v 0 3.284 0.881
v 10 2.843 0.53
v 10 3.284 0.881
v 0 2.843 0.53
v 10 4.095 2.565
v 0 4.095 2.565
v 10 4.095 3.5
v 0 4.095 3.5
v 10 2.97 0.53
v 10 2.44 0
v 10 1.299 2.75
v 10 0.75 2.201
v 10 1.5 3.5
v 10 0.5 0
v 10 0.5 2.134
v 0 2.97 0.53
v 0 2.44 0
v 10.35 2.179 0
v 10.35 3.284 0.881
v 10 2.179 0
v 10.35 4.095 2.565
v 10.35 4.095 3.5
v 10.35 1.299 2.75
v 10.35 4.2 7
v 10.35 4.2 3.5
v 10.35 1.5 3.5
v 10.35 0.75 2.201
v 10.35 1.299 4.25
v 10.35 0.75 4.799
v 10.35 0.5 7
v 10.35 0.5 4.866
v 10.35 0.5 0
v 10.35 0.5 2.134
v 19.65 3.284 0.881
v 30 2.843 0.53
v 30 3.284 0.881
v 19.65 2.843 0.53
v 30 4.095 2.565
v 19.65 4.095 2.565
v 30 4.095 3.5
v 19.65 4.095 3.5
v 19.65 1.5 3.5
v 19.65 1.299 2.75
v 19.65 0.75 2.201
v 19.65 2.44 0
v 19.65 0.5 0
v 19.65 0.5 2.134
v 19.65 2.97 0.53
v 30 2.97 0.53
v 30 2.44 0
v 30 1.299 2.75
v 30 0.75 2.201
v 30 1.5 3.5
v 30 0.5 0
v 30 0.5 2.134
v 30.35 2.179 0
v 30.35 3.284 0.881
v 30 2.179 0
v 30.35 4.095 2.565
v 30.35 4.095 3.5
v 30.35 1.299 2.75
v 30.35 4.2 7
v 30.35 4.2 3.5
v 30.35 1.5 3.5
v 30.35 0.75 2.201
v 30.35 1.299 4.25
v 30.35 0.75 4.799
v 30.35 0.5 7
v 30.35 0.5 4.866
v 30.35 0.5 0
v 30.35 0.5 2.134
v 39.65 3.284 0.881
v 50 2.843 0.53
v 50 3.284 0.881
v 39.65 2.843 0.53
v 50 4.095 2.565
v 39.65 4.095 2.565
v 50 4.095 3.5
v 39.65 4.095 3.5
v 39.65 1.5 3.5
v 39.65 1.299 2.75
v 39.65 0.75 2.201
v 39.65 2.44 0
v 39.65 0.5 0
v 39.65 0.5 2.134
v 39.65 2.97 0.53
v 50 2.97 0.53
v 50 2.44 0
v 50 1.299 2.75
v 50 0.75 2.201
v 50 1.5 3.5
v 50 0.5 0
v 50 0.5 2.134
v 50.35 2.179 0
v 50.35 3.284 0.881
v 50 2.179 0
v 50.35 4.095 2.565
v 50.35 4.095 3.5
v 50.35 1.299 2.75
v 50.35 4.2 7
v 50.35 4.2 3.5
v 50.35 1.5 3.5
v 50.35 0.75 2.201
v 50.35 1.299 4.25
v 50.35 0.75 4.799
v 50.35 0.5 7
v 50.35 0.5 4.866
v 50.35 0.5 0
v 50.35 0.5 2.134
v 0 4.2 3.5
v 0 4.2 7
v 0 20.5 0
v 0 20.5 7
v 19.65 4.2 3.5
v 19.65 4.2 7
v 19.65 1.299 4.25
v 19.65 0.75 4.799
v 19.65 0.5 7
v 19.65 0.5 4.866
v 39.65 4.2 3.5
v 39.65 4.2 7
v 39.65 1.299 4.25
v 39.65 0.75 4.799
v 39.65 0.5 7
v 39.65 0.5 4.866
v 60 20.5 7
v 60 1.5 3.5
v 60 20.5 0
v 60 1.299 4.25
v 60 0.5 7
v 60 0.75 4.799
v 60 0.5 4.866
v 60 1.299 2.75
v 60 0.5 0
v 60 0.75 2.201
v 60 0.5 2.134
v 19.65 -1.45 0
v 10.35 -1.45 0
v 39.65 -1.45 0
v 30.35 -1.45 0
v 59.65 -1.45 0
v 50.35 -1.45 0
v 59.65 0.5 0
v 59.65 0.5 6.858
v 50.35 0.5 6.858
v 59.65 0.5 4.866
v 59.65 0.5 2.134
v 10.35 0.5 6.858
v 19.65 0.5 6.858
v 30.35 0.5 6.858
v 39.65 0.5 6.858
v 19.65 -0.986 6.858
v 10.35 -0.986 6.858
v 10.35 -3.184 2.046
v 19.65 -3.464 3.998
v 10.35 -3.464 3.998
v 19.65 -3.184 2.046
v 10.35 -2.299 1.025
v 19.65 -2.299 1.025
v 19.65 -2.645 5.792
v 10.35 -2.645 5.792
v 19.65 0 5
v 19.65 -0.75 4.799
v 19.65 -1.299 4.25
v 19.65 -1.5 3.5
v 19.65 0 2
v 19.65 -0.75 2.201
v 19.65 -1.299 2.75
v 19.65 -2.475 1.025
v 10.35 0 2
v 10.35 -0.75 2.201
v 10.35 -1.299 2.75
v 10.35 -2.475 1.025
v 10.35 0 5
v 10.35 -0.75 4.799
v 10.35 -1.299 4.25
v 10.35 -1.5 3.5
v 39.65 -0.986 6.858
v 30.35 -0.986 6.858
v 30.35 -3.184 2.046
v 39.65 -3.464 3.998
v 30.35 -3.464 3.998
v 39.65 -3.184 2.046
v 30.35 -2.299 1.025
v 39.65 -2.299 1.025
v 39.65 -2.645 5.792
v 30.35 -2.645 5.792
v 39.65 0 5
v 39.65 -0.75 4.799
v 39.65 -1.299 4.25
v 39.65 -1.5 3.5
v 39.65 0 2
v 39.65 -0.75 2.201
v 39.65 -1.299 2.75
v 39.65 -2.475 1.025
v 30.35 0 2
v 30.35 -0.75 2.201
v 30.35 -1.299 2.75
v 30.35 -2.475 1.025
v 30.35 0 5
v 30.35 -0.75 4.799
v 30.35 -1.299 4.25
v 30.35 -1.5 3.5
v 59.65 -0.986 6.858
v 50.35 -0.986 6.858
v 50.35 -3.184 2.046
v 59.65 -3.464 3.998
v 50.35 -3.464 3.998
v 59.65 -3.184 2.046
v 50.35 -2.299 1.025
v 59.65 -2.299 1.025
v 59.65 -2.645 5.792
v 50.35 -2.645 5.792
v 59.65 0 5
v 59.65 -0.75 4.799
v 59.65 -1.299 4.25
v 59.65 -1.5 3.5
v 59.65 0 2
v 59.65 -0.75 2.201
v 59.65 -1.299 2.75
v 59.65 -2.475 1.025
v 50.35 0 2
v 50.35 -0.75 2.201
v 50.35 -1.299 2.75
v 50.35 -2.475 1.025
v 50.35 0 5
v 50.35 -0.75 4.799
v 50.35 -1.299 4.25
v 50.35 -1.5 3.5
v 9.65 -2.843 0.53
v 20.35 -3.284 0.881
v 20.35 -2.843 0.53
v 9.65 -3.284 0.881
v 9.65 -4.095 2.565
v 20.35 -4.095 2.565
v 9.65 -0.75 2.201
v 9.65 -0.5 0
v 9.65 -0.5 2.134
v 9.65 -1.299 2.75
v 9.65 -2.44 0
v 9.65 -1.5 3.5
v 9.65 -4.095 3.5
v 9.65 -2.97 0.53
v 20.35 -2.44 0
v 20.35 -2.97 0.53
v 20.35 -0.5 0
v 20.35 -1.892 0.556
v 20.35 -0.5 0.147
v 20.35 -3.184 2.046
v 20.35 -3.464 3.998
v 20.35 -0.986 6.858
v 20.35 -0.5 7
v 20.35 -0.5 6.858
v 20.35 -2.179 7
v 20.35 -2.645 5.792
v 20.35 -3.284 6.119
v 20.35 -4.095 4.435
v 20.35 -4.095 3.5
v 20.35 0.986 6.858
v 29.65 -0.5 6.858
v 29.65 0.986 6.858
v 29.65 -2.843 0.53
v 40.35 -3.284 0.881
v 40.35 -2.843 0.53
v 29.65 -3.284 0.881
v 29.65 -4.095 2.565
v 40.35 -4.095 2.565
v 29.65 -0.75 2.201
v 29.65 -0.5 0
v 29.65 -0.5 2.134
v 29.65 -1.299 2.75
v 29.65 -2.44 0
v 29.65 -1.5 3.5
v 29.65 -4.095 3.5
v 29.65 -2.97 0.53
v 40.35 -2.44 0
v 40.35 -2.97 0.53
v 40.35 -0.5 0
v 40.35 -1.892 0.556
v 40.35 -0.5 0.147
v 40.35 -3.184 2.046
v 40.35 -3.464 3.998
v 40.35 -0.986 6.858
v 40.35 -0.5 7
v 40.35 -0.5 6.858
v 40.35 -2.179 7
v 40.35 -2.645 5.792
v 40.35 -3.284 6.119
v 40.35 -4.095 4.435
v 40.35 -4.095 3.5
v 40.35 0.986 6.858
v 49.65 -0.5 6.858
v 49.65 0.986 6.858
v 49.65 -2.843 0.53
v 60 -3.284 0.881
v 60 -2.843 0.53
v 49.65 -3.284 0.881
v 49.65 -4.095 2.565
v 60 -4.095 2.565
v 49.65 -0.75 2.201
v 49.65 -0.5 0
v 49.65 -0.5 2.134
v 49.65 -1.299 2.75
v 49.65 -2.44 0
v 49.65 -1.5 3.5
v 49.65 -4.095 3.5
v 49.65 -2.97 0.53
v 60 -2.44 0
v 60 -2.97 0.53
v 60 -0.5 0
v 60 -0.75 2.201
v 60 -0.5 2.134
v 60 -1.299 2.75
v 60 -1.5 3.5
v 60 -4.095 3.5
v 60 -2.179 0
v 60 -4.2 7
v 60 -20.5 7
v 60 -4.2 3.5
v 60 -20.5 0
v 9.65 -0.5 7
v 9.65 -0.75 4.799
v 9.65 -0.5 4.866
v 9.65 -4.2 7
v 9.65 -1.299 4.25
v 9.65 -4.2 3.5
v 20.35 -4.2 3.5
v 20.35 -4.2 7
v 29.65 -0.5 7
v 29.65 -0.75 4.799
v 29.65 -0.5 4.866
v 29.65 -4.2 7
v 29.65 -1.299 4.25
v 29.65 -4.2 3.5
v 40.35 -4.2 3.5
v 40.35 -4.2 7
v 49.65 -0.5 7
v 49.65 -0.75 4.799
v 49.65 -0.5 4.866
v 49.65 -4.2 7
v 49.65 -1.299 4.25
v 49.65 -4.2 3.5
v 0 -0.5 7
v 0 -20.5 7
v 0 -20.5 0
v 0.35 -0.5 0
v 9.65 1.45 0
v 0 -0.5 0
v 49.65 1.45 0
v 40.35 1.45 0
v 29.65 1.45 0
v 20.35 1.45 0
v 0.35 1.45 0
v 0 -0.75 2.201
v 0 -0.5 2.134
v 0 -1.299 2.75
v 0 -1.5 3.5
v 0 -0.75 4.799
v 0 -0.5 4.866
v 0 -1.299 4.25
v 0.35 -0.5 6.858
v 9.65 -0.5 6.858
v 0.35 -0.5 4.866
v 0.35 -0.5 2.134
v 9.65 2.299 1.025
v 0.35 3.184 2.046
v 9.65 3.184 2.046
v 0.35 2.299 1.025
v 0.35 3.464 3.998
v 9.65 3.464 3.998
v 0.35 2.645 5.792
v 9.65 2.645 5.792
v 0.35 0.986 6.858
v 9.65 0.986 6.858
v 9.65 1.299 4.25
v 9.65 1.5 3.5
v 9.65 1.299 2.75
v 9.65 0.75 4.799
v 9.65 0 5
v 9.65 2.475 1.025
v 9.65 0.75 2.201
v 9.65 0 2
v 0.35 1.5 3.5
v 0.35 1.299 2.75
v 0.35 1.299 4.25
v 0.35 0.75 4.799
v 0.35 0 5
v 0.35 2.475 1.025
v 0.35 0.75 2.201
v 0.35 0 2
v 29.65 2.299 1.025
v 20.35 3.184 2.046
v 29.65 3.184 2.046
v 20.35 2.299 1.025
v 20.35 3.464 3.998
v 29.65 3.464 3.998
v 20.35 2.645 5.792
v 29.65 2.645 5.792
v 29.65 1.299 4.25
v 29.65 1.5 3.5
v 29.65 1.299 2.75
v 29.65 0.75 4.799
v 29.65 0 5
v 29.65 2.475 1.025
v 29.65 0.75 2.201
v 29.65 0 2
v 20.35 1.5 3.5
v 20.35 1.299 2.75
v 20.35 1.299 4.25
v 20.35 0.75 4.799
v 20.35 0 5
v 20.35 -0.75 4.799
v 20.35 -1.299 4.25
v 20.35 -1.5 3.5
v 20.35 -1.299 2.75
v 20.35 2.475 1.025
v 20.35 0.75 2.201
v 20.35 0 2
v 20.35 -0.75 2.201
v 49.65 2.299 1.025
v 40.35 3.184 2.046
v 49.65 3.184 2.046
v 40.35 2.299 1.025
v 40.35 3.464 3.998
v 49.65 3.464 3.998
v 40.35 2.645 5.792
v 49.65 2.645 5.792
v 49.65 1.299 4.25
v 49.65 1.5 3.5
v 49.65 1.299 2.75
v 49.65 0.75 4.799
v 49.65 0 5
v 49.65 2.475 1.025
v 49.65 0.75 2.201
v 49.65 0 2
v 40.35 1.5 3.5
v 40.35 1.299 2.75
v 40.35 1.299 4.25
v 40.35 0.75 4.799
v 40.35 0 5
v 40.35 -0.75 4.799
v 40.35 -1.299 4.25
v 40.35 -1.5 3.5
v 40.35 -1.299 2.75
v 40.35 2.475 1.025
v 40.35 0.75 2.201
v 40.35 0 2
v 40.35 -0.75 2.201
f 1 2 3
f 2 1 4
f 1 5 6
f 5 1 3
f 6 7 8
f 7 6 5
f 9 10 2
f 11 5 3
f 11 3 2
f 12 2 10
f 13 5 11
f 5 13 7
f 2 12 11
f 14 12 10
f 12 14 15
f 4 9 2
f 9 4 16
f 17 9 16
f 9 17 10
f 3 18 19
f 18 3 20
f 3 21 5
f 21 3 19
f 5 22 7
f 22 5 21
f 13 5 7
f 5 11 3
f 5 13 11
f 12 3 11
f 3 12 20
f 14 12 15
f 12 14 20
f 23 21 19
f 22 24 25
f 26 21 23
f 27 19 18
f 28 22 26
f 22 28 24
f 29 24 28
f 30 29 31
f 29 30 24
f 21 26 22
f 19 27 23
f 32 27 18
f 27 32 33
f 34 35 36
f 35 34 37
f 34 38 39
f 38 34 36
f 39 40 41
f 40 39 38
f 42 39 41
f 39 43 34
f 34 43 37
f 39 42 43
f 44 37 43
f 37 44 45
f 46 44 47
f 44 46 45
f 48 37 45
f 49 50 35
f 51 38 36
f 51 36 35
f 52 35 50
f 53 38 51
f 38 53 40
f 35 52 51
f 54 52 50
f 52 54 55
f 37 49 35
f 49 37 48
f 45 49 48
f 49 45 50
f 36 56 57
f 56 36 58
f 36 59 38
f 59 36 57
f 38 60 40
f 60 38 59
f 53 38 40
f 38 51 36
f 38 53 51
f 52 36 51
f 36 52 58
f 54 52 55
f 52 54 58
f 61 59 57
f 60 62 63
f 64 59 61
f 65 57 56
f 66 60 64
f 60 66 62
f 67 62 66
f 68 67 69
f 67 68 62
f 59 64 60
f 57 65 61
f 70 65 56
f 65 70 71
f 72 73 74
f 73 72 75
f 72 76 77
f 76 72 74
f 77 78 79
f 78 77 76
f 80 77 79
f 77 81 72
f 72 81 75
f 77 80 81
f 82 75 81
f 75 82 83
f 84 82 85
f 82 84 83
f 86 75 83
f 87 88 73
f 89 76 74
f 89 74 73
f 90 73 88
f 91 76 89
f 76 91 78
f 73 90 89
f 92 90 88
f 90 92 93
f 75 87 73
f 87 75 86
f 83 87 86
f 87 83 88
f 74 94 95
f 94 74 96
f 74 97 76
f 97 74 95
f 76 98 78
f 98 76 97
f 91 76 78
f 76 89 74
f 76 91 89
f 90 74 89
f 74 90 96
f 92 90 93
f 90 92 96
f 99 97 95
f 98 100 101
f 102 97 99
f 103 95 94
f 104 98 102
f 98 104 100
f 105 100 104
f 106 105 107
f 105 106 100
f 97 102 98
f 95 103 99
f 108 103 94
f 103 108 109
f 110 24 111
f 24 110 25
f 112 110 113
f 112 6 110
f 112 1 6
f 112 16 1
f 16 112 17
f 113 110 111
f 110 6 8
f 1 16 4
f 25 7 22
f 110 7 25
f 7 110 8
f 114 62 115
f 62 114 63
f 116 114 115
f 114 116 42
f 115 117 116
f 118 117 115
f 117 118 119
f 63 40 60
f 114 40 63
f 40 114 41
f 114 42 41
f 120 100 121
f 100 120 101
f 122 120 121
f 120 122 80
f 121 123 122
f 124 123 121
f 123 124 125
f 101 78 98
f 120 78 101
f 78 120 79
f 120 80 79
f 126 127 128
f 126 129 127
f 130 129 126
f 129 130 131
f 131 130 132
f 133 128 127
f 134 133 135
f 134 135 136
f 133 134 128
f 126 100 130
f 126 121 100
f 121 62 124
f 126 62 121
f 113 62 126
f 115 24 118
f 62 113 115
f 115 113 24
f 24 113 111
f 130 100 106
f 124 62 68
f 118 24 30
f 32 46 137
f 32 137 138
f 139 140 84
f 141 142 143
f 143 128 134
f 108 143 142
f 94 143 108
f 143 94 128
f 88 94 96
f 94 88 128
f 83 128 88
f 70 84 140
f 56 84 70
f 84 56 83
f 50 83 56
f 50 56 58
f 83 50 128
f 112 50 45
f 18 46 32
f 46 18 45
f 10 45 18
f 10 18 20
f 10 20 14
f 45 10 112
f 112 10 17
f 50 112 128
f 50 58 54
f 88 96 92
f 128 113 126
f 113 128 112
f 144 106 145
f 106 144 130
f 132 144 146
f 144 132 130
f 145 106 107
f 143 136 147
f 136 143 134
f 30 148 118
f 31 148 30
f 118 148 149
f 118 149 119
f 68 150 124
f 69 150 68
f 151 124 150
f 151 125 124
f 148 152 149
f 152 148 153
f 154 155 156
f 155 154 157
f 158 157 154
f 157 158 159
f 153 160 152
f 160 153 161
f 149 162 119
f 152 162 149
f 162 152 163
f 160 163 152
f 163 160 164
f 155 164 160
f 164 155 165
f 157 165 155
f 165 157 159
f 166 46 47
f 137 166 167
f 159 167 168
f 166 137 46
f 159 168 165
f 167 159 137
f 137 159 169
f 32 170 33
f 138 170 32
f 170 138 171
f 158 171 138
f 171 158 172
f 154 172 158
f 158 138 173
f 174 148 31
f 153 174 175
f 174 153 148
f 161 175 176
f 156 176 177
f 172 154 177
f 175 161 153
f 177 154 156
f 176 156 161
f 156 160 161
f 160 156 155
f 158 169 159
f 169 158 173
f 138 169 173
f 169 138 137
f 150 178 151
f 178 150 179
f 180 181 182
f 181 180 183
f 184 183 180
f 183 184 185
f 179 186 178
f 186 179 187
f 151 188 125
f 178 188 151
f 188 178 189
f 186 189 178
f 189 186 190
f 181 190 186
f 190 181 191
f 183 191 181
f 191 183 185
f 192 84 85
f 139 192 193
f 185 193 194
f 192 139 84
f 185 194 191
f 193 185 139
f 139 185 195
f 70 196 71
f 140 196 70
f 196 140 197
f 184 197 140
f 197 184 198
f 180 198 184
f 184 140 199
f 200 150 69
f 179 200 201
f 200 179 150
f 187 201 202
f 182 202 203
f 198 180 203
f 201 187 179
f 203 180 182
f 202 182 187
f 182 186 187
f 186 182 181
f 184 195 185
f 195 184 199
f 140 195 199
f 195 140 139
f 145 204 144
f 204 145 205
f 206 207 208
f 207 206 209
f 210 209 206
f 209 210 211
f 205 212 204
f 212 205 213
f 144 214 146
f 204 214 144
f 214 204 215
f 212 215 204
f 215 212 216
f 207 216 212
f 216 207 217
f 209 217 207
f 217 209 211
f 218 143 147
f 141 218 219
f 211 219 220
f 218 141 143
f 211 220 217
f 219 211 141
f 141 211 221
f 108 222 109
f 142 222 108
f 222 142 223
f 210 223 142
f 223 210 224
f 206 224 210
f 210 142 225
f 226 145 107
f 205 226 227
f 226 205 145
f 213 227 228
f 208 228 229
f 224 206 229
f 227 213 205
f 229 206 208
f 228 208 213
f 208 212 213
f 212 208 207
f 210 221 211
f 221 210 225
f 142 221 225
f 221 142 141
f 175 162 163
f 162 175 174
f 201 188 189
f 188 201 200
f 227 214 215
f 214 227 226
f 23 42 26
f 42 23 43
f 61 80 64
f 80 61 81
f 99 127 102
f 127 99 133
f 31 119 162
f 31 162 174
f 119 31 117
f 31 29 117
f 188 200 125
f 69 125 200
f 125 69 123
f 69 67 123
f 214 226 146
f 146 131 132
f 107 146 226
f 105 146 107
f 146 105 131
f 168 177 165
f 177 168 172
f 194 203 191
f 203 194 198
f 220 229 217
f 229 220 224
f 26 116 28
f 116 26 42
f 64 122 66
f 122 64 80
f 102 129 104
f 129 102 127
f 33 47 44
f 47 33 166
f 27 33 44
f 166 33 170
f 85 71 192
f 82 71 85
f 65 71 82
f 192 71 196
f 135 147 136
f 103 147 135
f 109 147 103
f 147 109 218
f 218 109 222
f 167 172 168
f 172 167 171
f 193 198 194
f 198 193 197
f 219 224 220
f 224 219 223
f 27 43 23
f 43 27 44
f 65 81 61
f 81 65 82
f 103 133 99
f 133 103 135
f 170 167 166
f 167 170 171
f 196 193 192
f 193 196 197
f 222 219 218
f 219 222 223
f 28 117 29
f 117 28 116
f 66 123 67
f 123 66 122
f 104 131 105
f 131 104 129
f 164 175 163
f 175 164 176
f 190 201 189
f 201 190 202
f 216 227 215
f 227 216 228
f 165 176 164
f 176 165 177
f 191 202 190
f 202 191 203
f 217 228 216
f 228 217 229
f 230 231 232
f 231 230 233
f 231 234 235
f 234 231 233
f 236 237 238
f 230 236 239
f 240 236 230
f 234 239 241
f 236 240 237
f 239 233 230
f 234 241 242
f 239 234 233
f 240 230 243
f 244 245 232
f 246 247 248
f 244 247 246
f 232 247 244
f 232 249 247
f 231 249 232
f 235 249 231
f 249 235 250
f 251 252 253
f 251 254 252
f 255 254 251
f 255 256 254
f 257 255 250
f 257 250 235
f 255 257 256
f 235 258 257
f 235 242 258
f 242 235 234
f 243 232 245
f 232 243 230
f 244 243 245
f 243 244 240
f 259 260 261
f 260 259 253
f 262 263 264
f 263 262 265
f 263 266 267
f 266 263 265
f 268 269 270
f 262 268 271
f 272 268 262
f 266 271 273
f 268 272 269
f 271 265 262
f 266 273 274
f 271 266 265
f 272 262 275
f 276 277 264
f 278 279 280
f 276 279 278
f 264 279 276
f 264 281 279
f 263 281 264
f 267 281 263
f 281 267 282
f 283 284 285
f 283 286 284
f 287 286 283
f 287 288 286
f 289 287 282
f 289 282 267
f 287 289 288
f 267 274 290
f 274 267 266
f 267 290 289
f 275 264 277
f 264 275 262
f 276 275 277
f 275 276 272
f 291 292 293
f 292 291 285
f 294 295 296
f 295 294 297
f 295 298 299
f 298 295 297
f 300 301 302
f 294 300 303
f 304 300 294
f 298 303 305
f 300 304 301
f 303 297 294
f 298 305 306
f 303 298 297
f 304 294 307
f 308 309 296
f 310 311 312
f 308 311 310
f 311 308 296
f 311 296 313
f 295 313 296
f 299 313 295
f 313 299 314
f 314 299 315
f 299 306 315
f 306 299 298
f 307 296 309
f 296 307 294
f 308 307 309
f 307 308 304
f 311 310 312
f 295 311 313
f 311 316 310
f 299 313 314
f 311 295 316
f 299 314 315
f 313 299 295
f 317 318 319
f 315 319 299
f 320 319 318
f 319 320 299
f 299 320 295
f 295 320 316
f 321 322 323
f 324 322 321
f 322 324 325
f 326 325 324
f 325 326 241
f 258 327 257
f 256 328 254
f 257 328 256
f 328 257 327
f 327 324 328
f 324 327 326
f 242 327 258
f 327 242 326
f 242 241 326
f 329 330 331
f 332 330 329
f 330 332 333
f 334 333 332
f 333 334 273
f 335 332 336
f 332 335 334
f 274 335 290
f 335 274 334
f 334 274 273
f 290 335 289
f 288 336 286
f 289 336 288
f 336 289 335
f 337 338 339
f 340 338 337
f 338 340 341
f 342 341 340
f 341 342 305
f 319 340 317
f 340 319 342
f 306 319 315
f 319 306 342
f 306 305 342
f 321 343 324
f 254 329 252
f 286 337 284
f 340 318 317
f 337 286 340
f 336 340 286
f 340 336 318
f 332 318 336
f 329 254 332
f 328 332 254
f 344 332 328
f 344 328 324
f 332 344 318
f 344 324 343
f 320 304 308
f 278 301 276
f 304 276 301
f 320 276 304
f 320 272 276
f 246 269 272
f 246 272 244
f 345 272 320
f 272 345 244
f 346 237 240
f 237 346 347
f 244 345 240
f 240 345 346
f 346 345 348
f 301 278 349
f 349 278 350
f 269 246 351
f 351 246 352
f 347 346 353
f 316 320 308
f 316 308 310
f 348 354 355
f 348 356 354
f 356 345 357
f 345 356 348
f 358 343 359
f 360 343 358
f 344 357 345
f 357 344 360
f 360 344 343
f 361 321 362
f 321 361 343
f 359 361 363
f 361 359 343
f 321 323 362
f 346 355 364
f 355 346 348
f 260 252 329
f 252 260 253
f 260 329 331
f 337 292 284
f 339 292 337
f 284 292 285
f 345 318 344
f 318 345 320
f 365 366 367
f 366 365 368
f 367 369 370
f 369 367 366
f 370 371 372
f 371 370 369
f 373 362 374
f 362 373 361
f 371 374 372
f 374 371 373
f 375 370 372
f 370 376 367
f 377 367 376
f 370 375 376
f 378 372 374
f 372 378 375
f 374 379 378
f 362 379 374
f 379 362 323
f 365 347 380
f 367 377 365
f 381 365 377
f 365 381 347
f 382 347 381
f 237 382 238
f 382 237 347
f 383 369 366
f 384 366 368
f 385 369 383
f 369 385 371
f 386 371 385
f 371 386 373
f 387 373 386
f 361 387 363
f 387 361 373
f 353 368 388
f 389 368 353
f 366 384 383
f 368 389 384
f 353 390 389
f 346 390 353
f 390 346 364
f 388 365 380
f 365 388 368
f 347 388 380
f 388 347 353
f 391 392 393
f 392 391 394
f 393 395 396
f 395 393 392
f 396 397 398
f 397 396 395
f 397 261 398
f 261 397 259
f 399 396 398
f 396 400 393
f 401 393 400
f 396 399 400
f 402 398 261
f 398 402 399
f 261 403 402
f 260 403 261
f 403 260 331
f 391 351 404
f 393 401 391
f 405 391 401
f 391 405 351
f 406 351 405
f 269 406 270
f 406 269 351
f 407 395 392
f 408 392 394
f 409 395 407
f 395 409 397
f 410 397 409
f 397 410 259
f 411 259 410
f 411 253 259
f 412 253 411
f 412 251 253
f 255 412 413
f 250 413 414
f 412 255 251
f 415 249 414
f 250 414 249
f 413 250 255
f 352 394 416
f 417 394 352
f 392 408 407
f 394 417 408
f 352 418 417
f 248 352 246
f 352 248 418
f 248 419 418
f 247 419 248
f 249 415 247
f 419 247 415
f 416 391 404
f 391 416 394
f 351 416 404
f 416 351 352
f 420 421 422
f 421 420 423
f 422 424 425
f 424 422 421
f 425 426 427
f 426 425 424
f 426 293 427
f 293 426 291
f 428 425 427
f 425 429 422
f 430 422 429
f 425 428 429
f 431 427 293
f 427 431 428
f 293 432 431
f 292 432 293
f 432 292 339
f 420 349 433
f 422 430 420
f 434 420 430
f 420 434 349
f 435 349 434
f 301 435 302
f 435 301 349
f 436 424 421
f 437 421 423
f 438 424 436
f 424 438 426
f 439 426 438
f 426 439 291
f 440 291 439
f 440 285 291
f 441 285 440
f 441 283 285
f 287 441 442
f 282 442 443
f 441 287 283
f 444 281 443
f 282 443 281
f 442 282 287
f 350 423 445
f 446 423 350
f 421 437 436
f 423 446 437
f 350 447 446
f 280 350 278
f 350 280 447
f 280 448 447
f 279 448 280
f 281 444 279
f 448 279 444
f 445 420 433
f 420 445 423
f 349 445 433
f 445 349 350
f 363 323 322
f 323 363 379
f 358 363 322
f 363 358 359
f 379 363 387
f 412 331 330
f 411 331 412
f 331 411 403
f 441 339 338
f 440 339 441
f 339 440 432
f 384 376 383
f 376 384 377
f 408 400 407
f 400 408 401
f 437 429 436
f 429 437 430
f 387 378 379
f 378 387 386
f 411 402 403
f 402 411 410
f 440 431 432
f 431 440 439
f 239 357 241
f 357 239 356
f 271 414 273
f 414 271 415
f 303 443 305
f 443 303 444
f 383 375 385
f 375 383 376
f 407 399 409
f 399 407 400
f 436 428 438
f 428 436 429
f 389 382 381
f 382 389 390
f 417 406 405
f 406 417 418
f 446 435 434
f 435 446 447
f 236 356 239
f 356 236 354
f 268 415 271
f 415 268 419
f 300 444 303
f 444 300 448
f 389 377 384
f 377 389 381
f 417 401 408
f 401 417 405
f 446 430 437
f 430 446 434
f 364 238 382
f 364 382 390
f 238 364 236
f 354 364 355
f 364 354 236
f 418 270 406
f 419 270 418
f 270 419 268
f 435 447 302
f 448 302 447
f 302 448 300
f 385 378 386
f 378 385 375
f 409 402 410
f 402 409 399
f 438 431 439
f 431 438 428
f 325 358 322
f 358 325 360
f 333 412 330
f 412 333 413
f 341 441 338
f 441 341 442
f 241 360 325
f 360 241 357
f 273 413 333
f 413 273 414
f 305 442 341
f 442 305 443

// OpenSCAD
// A library to create print-in-place horizontal hinges.
//
// Copyright (c) 2020 Rodrigo Chandia (rodrigo.chandia@gmail.com)
// All rights reserved.
//
// This program is distributed in the hope that it will be useful,
// but WITHOUT ANY WARRANTY; without even the implied warranty of
// MERCHANTABILITY or FITNESS FOR A PARTICULAR PURPOSE.
//
// The contents of this file are DUAL-LICENSED.  You may modify and/or
// redistribute this software according to the terms of one of the
// following two licenses (at your option):
//
// License 1: Attribution-ShareAlike 4.0 International (CC BY-SA 4.0)
//            https://creativecommons.org/licenses/by-sa/4.0/
//
// License 2: GNU General Public License (GPLv3)
//            https://www.gnu.org/licenses/gpl-3.0.en.html
//
// You should have received a copy of the GNU General Public License
// along with this program. https://www.gnu.org/licenses/
//

module bottomWedge(r, d, rodH, tolerance, other) {
  wedgeH = (r + tolerance) * sin(45);
  wedgeBottom = max(r + tolerance, d);
  wedgeFlip = other ? 1 : -1;
  linear_extrude(height = rodH)
  polygon(points=[
    [wedgeH,wedgeFlip*-r],
    [wedgeH,wedgeFlip*wedgeH],
    [wedgeBottom,wedgeFlip*(wedgeH - (wedgeBottom - wedgeH))],
    [wedgeBottom,wedgeFlip*-r]
  ]);
}

module hingeRodNegative(r, d, h, tolerance, tip, other) {
  difference() {
    translate([0,0,d])
    rotate([0,90,0]) {
      translate([0, 0, -tolerance/2]) {
        rodH = h  + (tip ? tolerance/2 : 0) + tolerance/2;
        cylinder(r = r + tolerance, h = rodH);
        bottomWedge(r, d, rodH, tolerance, other);
      }
      if (tip) {
        translate([0,0,h])
        cylinder(r = r, h = tolerance + 0.01);
        translate([0,0,h + tolerance])
        cylinder(r1 = r, r2 = 0, h = r + tolerance);
      } else {
        translate([0,0,h])
        cylinder(r = r + tolerance, h = tolerance / 2);
      }
    }
    translate([
      -tolerance/2 - 0.01,
      other ? -r - tolerance : 0,
      -0.01])
    cube([h + tolerance + + 0.02 + (tip ? r + tolerance * 1.5 : 0), r + tolerance, d + r + tolerance + 0.02]);
  }
}

module hingeRod(r, d, h, tip, dip, tolerance, negative, other) {
  if (negative) {
    hingeRodNegative(r, d, h, tolerance, tip, other);
  } else {
    toleranceTip = tip ? tolerance/2 : tolerance/2;
    toleranceDip = dip ? tolerance/2 : tolerance/2;
    translate([0,0,d])
    rotate([0,90,0])
    difference() {
      union() {
        rodH = h - toleranceTip - toleranceDip;
        translate([0,0,toleranceDip]) {
          cylinder(r = r, h = rodH);
          bottomWedge(r, d, rodH, 0, !other);
        }
        if (tip) {
          translate([0,0,h - toleranceTip - 0.01])
          cylinder(r1 = r, r2 = 0, h = r + 0.01);
        }
      }
      if (dip) {
        translate([0,0,toleranceDip-0.01])
        cylinder(r1 = r, r2 = 0, h = r + tolerance);
      }
    }
  }
}

function xor(a, b) = (a && !b) || (b && !a);

module hingeCorner(r, cornerHeight, hingeLength, pieces, other, negative, tolerance, bolted = true) {
  startAtFirst = xor(other, negative);
  for (i = [1:pieces]) {
    if (i % 2 == (startAtFirst ? 0 : 1)) {
      translate([hingeLength / pieces * (i - 1),0,0])
      hingeRod(r, cornerHeight, hingeLength / pieces, ((i != pieces || cornerHeight > (hingeLength / pieces))&& bolted) , i != 1 && bolted, tolerance, negative, other);
    }   
  }
}

module applyHingeCorner(position = [0,0,0], rotation = [0,0,0], r = 3, cornerHeight = 5, hingeLength = 15, pieces = 3, tolerance = 0.3) {
  translate(position)
  for (i = [0:1]) {
    difference() {
      translate(-position)
      children(i);
      rotate(rotation)
      hingeCorner(r, cornerHeight, hingeLength, pieces, i == 0, true, tolerance);
    }
    rotate(rotation)
    hingeCorner(r, cornerHeight, hingeLength, pieces, i == 0, false, tolerance);
  }
  if ($children > 2) {
    children([2:$children-1]);
  }
}

module applyHinges(positions, rotations, r, cornerHeight, hingeLength, pieces, tolerance) {
  difference() {
    children();
    for (j = [0 : 1 : len(positions) - 1]) {
      translate(positions[j])
      rotate([0,0, rotations[j]])
      for (b = [0, 1]) {
        hingeCorner(r, cornerHeight, hingeLength, pieces, b == 0, true, tolerance);
      }
    }
  }
  for (j = [0 : 1 : len(positions) - 1]) {
    translate(positions[j])
    rotate([0,0, rotations[j]])
    for (b = [0, 1]) {
      hingeCorner(r, cornerHeight, hingeLength, pieces, b == 0, false, tolerance);
    }
  }
}

module negativeExtraAngle(position, rotation, cornerHeight, centerHeight, hingeLength, pieces, tolerance, other, angle) {
  translate(position)
  rotate(rotation) {
    startAtFirst = !other;
    l = (cornerHeight + tolerance - centerHeight) / tan(90-angle / 2);
    for (i = [1 : pieces]) {
      if (i % 2 == (startAtFirst ? 0 : 1)) {
        dip = i != 1;
        w = hingeLength / pieces + (dip ? 1 : 0.5) * tolerance;
        positionX = (i - 1) * hingeLength / pieces + (dip ? -tolerance / 2 : 0);
        difference() {
          translate([ positionX, 0, centerHeight])
          rotate([other ? -angle : angle, 0, 0])
          translate([0, other ? -l : 0, -centerHeight])
          cube([w, l, cornerHeight + tolerance]);
          
          translate([positionX - 0.01, other ? -cornerHeight + 0.01 : -0.01, 0])
          cube([w + 0.02, cornerHeight, 2 * cornerHeight]);
          
          diffY = norm([l, cornerHeight + tolerance]);
          translate([positionX - 0.01, other? -0.01 : -diffY - 2 * tolerance + 0.01, cornerHeight + 0.01])
          cube([w + 0.02, diffY + 2 * tolerance, diffY]);
        }
      }    
    }
  }
}

module applyExtraAngle(positions, rotations, cornerHeight, centerHeight, hingeLength, pieces, tolerance, angle) {
  difference() {
    children();
    for (j = [0 : 1 : len(positions) - 1]) {
      negativeExtraAngle(positions[j], rotations[j], cornerHeight, centerHeight, hingeLength, pieces, tolerance, false, angle);
      negativeExtraAngle(positions[j], rotations[j], cornerHeight, centerHeight, hingeLength, pieces, tolerance, true, angle);
    }
  }
}


left_part(boltless = false, boltradius = 1.5);
right_part(boltless = false, boltradius = 1.5);


module bolt(boltradius) {
    translate([0,0,7/2]) rotate([0,90,0]) cylinder(70,boltradius,boltradius,$fn = 12);
} 

module left_part(len=20, tolerance = 0.7, boltless = true, boltradius = 1.5) {
    difference() {
        union() {
            difference() {
                translate([0,0.5,0]) cube([60,len,7]);
                hingeCorner(7/2, 7/2, 60, 6, true, true, tolerance, boltless);
                negativeExtraAngle([0,0,0], [0,0,0], 7, 7/2, 60, 6, tolerance, true, 90);
            }
            hingeCorner(7/2, 7/2, 60, 6, true, false, tolerance, boltless);
        }
      if (boltless==false) bolt(boltradius);
    }
 }

module right_part(len=20, tolerance = 0.7, boltless = true, boltradius) {
    difference() {
        union() {
            difference() {
                translate([0,(-0.5)-len,0]) cube([60,len,7]);
                hingeCorner(7/2, 7/2, 60, 6, false, true, tolerance);
                negativeExtraAngle([0,0,0], [0,0,0], 7, 7/2, 60, 6, tolerance, false, 90);
            }
            hingeCorner(7/2, 7/2, 60, 6, false, false, tolerance, boltless);
        }
      if (boltless==false) bolt(boltradius);
    }
 }
